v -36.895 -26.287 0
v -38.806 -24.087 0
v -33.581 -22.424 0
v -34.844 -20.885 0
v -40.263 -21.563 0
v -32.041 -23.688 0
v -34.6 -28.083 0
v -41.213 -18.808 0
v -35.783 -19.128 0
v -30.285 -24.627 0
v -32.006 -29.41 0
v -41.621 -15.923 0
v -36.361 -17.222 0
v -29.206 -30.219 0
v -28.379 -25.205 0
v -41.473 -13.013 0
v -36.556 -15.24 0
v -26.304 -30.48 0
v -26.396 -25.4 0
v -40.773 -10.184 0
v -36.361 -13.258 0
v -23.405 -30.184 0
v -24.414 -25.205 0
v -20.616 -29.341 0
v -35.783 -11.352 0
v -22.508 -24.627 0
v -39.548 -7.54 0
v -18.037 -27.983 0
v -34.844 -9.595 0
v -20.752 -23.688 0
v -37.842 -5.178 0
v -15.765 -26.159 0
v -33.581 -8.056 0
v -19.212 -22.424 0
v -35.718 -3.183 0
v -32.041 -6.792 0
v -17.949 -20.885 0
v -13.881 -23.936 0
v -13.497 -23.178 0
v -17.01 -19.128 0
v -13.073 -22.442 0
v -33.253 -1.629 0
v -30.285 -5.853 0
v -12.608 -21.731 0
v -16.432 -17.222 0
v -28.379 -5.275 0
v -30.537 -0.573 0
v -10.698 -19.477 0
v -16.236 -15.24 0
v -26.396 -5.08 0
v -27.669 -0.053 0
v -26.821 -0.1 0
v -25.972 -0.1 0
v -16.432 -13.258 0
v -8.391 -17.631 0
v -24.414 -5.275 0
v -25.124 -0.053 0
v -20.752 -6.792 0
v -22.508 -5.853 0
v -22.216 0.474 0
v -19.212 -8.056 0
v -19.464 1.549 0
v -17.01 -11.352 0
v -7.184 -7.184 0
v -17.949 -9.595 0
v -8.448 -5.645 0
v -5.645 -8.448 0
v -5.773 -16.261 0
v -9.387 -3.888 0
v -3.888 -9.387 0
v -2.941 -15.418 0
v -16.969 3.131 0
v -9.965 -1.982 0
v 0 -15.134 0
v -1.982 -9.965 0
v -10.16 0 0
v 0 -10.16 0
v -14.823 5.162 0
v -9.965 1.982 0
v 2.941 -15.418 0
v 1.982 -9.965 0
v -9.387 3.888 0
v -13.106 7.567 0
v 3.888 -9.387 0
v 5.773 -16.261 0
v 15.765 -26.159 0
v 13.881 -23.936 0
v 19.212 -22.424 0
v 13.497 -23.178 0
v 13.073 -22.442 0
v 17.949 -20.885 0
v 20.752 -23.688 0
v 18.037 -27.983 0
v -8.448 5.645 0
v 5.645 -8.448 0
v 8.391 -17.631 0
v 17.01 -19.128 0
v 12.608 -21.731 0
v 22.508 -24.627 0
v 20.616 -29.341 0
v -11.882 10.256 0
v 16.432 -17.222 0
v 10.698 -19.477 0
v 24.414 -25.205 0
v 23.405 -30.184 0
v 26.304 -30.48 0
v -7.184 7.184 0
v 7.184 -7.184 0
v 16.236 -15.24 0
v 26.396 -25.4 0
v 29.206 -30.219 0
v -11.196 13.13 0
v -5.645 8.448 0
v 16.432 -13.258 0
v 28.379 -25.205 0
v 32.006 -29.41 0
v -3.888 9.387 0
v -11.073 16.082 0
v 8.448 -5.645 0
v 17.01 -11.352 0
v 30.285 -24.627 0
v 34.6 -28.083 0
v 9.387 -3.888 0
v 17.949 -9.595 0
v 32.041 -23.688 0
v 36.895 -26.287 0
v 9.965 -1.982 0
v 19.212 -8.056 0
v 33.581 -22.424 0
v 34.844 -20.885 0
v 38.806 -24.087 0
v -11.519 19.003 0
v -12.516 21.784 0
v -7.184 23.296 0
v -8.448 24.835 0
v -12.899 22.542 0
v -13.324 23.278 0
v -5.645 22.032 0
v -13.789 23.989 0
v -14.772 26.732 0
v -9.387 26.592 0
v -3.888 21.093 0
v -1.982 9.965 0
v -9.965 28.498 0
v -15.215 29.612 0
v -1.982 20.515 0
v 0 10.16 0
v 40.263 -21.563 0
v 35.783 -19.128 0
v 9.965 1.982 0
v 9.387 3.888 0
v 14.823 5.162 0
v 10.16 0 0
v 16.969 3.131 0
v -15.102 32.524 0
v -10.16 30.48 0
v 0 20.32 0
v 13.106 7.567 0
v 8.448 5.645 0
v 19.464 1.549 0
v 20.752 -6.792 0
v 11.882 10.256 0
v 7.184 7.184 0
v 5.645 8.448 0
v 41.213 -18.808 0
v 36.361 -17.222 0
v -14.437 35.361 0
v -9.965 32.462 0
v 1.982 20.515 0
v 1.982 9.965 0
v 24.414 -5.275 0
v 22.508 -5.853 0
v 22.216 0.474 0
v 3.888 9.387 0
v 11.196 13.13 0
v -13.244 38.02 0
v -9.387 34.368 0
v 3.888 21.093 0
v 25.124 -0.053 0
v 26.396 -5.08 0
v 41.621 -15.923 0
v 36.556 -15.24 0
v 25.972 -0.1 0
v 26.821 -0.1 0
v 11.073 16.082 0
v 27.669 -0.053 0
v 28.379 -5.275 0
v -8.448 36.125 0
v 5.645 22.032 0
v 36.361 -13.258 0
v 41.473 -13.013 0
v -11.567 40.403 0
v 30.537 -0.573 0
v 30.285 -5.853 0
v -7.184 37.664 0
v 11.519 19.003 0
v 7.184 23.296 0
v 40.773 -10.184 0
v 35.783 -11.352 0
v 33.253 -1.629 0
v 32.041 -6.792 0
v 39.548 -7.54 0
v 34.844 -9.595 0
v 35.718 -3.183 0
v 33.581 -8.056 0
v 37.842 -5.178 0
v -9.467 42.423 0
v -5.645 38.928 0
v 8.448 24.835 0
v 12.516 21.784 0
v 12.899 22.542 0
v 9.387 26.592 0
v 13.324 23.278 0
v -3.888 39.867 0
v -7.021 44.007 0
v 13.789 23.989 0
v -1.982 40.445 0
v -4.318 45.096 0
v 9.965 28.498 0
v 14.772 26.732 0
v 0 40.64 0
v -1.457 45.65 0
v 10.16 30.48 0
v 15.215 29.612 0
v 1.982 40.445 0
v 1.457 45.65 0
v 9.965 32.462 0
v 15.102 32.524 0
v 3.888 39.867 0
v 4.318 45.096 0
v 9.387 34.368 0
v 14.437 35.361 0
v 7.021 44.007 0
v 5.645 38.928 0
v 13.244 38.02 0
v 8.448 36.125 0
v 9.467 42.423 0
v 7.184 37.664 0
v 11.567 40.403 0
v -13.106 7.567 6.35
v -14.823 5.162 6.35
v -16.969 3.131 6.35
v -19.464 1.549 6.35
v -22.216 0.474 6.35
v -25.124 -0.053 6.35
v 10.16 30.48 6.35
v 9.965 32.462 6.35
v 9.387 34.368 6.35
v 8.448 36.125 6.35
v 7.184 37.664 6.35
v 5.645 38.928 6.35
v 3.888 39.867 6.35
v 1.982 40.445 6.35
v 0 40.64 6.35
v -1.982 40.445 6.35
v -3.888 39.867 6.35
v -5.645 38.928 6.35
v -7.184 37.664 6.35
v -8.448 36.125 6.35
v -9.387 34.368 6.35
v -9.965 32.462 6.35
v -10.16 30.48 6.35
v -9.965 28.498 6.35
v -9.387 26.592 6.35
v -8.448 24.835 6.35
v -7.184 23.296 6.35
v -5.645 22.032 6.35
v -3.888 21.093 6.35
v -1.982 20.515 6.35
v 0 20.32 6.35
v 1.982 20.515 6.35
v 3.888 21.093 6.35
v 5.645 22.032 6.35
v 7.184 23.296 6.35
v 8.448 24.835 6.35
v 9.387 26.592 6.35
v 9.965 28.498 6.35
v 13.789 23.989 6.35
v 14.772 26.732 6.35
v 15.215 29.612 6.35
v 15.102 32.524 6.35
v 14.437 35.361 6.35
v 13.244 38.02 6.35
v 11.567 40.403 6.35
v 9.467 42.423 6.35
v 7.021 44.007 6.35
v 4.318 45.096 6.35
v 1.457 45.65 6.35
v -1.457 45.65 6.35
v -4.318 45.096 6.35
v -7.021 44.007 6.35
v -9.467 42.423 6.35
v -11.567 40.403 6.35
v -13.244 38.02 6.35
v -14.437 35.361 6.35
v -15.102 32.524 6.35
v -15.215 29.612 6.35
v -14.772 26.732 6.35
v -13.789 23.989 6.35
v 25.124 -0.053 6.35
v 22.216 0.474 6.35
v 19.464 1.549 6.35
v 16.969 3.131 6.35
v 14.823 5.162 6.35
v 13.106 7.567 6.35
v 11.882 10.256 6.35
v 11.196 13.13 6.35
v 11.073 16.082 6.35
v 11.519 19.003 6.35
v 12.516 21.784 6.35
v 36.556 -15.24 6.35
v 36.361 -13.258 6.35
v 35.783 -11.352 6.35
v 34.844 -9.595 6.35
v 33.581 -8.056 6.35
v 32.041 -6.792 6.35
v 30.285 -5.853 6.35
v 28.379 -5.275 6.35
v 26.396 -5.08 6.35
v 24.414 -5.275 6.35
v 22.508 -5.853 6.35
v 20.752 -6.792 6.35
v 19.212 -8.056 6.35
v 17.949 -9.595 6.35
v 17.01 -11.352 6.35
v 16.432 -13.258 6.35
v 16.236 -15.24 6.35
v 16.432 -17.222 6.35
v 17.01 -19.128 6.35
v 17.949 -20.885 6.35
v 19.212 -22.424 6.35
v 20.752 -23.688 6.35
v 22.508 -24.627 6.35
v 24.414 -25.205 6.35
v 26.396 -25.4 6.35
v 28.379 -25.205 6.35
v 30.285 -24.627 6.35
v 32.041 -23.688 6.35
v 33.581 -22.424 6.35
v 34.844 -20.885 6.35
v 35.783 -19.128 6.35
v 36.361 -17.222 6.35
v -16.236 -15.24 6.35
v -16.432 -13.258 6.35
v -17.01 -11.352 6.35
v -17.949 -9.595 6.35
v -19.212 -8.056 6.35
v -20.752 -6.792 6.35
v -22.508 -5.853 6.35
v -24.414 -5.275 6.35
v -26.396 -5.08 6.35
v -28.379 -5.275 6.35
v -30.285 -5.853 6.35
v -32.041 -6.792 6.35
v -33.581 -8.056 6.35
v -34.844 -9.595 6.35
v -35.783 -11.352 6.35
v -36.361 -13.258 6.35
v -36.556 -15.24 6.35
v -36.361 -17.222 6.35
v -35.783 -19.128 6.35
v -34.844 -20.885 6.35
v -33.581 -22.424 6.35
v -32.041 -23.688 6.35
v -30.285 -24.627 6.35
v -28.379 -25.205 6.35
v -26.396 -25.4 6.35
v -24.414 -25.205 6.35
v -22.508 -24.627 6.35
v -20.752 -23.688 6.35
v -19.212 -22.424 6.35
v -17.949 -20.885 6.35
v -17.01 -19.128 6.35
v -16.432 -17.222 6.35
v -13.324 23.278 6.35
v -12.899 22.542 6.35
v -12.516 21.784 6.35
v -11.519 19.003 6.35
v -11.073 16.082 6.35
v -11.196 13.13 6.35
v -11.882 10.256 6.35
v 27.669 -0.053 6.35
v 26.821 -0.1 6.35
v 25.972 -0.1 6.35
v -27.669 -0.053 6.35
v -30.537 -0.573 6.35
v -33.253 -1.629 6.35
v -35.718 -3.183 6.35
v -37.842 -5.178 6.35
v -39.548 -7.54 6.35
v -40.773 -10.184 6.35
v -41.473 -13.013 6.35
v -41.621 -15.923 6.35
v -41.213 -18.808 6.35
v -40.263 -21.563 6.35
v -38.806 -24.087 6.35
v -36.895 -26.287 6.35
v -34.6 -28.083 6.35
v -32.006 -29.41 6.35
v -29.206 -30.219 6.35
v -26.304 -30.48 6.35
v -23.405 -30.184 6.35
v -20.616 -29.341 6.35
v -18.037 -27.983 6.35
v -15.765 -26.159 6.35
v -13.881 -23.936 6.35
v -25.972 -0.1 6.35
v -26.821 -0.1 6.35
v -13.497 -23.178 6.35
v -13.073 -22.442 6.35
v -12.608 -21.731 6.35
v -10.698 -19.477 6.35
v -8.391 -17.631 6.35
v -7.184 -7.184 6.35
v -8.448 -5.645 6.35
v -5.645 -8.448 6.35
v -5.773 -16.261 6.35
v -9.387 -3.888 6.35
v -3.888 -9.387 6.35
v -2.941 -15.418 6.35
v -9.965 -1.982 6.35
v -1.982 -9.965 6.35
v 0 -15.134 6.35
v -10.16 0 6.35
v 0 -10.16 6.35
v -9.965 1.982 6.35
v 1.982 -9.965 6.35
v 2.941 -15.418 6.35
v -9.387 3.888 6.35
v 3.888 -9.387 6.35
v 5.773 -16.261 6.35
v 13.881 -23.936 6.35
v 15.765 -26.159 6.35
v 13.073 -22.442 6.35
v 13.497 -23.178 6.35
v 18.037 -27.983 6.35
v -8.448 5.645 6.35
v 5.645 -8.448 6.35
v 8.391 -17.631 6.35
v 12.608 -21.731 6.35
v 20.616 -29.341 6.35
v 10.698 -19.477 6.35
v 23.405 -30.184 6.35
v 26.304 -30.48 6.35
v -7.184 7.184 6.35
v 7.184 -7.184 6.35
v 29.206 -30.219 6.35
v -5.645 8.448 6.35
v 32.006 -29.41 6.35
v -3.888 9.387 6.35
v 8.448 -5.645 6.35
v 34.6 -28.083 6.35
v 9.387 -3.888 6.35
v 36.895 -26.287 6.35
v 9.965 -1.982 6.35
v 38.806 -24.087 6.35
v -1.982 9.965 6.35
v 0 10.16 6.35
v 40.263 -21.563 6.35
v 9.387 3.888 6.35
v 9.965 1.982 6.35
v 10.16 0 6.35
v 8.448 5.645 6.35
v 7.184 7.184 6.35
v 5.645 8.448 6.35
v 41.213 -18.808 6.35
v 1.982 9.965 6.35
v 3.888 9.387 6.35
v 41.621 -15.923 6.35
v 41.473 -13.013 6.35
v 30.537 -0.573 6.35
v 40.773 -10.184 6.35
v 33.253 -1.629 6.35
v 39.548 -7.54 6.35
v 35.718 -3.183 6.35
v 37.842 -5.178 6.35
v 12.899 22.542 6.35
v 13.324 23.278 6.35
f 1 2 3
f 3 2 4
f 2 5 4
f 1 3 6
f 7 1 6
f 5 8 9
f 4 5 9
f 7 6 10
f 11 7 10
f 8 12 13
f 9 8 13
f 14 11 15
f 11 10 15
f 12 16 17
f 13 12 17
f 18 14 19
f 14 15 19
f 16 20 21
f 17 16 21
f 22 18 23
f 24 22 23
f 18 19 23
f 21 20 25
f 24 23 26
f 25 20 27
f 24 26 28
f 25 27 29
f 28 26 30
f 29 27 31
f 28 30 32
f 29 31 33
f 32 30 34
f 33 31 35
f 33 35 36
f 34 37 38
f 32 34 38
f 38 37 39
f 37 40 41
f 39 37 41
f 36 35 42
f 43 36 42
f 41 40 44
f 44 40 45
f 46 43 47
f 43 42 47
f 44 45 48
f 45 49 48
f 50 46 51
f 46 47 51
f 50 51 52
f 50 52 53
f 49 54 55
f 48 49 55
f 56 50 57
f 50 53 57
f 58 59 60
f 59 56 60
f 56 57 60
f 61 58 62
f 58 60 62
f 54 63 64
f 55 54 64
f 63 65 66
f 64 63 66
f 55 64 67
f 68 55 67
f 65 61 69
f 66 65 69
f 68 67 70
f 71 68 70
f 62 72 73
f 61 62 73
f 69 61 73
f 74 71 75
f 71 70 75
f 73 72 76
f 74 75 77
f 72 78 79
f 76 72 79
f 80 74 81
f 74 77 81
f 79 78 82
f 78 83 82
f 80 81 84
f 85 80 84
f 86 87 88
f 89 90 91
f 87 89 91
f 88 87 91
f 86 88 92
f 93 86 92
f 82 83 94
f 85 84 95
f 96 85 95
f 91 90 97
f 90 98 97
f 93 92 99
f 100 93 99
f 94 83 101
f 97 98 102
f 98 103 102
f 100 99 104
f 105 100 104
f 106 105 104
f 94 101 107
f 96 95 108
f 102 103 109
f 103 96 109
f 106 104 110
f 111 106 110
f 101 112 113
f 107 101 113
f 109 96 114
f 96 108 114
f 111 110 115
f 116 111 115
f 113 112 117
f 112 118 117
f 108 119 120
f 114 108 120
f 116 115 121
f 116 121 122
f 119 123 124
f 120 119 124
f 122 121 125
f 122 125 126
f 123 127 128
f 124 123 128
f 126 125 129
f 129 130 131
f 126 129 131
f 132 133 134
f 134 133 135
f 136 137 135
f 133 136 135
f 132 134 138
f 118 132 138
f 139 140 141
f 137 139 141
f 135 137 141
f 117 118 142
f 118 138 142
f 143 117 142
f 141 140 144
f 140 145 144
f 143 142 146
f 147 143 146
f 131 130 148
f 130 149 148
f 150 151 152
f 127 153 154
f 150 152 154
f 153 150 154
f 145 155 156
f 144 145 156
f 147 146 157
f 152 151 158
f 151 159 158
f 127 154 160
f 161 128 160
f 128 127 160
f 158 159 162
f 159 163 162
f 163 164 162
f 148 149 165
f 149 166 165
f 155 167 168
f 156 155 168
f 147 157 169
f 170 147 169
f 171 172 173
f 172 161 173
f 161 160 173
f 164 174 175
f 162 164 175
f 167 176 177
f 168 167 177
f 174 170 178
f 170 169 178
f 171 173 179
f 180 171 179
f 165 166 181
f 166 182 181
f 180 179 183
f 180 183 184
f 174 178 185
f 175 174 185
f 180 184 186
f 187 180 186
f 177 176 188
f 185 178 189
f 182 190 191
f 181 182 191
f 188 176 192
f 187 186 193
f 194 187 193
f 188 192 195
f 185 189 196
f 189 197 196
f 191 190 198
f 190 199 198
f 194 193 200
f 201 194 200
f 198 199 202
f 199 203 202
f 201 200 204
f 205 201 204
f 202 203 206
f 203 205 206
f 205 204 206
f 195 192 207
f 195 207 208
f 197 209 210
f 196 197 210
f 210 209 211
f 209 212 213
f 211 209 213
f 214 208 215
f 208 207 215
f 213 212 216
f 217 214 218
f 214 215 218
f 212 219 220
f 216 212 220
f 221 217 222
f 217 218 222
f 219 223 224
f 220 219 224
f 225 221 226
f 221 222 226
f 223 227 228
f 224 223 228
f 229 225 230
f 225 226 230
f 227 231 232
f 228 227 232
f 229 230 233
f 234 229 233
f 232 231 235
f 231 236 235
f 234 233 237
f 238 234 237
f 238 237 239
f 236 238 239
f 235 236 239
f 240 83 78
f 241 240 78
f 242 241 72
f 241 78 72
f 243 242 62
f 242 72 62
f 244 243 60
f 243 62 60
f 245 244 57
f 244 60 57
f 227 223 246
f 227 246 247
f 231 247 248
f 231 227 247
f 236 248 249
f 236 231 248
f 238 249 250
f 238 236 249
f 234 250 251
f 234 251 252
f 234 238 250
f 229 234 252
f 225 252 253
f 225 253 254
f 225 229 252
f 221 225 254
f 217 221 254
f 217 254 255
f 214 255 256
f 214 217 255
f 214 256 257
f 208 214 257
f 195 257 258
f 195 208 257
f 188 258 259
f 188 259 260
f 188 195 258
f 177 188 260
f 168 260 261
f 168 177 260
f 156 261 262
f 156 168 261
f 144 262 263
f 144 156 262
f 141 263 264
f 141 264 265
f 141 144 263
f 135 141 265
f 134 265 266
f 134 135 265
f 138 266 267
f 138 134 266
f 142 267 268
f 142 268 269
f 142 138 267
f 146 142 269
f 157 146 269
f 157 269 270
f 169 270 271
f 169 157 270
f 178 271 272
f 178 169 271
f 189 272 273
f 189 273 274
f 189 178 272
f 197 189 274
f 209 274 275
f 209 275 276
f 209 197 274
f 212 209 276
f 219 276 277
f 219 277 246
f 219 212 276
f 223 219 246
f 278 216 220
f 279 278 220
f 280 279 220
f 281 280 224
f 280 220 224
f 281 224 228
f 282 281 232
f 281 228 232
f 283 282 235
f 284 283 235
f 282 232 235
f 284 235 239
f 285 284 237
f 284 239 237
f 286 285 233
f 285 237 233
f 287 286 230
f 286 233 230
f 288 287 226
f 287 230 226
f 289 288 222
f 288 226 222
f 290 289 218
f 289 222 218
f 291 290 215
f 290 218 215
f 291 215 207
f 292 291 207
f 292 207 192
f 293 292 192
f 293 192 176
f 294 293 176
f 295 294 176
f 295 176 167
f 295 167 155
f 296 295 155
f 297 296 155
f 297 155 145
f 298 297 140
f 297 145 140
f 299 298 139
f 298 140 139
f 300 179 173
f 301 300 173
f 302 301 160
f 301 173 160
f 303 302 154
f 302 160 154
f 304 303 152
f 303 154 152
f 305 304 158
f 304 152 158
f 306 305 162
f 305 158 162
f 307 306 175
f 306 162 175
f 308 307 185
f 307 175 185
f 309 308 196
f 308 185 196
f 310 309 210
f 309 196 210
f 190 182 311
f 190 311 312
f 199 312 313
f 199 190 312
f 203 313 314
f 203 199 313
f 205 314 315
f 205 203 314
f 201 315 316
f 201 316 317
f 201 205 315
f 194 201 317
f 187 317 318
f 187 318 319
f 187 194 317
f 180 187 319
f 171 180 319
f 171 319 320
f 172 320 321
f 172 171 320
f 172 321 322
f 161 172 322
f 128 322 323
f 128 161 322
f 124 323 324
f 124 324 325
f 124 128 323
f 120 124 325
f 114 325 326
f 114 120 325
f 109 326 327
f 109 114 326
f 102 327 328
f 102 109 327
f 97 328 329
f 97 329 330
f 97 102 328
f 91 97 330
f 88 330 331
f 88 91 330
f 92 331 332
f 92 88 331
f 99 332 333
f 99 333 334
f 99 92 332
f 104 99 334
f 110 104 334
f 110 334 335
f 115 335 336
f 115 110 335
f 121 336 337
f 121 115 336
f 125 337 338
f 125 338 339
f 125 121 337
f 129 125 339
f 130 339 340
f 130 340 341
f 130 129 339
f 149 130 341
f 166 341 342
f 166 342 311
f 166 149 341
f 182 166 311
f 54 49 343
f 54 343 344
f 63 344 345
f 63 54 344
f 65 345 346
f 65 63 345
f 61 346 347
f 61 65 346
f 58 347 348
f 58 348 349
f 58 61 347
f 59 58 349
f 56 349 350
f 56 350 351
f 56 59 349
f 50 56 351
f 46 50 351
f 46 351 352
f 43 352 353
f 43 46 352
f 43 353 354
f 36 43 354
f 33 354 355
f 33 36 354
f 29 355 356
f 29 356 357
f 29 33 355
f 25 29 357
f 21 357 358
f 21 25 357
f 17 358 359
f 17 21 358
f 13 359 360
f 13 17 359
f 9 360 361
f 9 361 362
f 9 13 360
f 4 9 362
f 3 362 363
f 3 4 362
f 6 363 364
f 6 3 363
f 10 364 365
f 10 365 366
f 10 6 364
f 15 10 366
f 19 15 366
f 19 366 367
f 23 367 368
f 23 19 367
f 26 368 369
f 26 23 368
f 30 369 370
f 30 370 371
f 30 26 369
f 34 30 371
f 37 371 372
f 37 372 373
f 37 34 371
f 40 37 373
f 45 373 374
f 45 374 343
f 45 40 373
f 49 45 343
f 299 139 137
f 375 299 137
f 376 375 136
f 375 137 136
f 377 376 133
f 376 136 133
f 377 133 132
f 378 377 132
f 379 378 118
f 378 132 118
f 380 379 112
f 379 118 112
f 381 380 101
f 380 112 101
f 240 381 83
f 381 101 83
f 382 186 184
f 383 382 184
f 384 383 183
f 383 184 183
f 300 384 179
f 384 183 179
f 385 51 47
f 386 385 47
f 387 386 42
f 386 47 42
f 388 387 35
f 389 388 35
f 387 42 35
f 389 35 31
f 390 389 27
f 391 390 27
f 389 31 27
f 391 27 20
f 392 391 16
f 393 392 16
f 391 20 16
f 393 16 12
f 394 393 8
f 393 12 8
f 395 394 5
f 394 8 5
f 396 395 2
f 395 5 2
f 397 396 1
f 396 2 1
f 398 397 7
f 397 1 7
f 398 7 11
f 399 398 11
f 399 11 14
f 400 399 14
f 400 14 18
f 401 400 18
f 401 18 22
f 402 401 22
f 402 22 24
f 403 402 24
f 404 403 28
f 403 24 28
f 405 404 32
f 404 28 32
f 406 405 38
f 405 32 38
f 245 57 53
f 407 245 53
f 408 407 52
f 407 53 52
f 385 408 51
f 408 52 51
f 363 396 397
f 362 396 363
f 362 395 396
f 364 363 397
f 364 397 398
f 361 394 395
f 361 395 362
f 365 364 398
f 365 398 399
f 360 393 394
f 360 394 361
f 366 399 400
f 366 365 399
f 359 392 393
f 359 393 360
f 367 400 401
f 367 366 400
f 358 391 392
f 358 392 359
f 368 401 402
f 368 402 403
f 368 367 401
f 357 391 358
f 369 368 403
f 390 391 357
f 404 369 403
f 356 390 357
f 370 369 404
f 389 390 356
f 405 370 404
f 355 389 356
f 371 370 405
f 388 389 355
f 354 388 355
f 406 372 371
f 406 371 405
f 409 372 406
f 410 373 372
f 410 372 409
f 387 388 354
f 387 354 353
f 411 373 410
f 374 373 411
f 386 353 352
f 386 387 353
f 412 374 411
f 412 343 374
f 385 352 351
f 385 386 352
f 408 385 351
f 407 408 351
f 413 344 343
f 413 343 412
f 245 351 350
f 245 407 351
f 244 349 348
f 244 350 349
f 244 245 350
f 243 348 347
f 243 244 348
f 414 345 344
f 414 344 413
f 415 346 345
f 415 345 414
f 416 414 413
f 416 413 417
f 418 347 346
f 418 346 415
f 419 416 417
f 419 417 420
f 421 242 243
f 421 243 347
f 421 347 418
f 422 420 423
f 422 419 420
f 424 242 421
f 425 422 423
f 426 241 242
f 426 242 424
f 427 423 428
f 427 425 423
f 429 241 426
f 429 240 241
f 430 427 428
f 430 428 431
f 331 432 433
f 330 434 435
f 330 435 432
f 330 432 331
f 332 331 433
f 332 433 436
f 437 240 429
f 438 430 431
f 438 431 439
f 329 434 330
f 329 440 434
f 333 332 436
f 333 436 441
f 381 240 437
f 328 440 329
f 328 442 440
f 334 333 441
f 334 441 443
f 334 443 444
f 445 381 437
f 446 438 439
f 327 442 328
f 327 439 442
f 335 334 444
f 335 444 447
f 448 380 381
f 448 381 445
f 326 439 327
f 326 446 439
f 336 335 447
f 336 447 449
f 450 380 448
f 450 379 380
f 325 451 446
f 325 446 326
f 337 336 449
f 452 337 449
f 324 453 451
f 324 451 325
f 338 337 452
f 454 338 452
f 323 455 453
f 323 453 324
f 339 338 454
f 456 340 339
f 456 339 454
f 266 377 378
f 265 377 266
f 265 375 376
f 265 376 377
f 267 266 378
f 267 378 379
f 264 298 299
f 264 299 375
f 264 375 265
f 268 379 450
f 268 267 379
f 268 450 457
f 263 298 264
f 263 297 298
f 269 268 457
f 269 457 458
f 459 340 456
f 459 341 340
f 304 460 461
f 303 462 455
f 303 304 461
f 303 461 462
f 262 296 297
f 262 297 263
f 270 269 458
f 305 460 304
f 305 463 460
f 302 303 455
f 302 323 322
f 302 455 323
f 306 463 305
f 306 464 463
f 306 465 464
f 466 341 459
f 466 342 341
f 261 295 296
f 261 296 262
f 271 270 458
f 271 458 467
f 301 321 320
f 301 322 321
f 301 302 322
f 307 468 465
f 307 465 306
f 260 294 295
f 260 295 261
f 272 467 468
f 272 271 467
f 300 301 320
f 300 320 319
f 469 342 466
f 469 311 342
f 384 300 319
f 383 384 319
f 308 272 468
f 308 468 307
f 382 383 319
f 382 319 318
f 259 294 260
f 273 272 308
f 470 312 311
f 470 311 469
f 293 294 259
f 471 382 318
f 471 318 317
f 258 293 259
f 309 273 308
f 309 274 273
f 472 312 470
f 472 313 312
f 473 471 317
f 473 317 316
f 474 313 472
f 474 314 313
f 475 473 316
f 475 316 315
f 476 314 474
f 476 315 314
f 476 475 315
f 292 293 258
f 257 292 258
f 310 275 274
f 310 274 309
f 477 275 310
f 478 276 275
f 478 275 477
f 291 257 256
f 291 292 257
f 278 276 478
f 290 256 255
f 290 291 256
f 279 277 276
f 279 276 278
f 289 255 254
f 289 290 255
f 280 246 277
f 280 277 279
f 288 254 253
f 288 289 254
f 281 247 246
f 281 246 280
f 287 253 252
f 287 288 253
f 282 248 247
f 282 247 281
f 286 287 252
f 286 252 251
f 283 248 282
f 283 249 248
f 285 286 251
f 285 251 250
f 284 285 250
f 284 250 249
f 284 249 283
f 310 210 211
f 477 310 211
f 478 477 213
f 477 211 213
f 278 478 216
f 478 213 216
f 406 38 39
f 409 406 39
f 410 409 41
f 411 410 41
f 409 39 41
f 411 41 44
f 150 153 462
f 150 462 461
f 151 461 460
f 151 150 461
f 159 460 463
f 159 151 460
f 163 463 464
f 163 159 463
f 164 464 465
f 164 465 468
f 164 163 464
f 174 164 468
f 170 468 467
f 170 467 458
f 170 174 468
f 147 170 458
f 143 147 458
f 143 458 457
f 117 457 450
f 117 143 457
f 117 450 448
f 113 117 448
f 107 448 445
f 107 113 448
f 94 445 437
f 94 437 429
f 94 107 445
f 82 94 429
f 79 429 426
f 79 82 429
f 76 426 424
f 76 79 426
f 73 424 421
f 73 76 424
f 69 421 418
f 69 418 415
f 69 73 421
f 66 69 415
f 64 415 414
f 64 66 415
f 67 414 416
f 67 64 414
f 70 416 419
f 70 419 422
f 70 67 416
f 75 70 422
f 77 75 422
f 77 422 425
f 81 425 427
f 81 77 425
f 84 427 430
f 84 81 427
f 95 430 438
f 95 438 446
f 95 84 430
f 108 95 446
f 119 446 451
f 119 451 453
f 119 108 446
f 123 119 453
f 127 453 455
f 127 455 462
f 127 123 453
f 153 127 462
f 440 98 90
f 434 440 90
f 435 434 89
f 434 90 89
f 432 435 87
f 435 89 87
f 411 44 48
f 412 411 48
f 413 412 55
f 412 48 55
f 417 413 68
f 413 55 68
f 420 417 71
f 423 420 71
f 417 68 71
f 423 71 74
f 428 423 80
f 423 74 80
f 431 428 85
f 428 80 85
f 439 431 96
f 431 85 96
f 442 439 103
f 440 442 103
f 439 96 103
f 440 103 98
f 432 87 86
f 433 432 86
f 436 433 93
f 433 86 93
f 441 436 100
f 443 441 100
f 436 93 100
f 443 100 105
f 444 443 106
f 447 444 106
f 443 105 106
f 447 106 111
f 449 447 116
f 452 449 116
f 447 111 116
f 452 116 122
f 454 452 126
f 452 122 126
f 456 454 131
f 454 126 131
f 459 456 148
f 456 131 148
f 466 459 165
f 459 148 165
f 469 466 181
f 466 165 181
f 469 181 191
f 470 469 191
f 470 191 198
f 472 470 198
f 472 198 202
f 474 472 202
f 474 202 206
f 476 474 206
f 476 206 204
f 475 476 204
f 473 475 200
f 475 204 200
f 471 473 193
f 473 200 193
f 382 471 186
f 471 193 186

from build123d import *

# Parameters (mm, degrees)
F0_R     = 10.16
F1_DEPTH = 6.35


with BuildPart() as f1:
    # F0 (on Top) → F1 (new body)
    with BuildSketch(Plane.XY):
        with BuildLine():
            ThreePointArc((25.123501, -0.053256), (13.106305, 7.566929), (12.515629, 21.784218))
            ThreePointArc((12.515629, 21.784218), (13.106305, 22.913071), (13.788583, 23.989038))
            ThreePointArc((13.788583, 23.989038), (0, 45.72), (-13.788583, 23.989038))
            ThreePointArc((-13.788583, 23.989038), (-13.106305, 22.913071), (-12.515629, 21.784218))
            ThreePointArc((-12.515629, 21.784218), (-11.063539, 14.602974), (-13.106305, 7.566929))
            ThreePointArc((-13.106305, 7.566929), (-18.178316, 2.279819), (-25.123501, -0.053256))
            ThreePointArc((-25.123501, -0.053256), (-26.396454, -0.106143), (-27.669408, -0.053256))
            ThreePointArc((-27.669408, -0.053256), (-39.594681, -22.86), (-13.880825, -23.935782))
            ThreePointArc((-13.880825, -23.935782), (-13.290149, -22.806929), (-12.607872, -21.730962))
            ThreePointArc((-12.607872, -21.730962), (0, -15.133857), (12.607872, -21.730962))
            ThreePointArc((12.607872, -21.730962), (13.290149, -22.806929), (13.880825, -23.935782))
            ThreePointArc((13.880825, -23.935782), (39.594681, -22.86), (27.669408, -0.053256))
            ThreePointArc((27.669408, -0.053256), (26.396454, -0.106143), (25.123501, -0.053256))
        make_face()
        with Locations((-26.396454, -15.24)):
            Circle(F0_R, mode=Mode.SUBTRACT)
        with Locations((26.396454, -15.24)):
            Circle(F0_R, mode=Mode.SUBTRACT)
        Circle(F0_R, mode=Mode.SUBTRACT)
        with Locations((0, 30.48)):
            Circle(F0_R, mode=Mode.SUBTRACT)
    extrude(amount=F1_DEPTH)


solid = f1.part
